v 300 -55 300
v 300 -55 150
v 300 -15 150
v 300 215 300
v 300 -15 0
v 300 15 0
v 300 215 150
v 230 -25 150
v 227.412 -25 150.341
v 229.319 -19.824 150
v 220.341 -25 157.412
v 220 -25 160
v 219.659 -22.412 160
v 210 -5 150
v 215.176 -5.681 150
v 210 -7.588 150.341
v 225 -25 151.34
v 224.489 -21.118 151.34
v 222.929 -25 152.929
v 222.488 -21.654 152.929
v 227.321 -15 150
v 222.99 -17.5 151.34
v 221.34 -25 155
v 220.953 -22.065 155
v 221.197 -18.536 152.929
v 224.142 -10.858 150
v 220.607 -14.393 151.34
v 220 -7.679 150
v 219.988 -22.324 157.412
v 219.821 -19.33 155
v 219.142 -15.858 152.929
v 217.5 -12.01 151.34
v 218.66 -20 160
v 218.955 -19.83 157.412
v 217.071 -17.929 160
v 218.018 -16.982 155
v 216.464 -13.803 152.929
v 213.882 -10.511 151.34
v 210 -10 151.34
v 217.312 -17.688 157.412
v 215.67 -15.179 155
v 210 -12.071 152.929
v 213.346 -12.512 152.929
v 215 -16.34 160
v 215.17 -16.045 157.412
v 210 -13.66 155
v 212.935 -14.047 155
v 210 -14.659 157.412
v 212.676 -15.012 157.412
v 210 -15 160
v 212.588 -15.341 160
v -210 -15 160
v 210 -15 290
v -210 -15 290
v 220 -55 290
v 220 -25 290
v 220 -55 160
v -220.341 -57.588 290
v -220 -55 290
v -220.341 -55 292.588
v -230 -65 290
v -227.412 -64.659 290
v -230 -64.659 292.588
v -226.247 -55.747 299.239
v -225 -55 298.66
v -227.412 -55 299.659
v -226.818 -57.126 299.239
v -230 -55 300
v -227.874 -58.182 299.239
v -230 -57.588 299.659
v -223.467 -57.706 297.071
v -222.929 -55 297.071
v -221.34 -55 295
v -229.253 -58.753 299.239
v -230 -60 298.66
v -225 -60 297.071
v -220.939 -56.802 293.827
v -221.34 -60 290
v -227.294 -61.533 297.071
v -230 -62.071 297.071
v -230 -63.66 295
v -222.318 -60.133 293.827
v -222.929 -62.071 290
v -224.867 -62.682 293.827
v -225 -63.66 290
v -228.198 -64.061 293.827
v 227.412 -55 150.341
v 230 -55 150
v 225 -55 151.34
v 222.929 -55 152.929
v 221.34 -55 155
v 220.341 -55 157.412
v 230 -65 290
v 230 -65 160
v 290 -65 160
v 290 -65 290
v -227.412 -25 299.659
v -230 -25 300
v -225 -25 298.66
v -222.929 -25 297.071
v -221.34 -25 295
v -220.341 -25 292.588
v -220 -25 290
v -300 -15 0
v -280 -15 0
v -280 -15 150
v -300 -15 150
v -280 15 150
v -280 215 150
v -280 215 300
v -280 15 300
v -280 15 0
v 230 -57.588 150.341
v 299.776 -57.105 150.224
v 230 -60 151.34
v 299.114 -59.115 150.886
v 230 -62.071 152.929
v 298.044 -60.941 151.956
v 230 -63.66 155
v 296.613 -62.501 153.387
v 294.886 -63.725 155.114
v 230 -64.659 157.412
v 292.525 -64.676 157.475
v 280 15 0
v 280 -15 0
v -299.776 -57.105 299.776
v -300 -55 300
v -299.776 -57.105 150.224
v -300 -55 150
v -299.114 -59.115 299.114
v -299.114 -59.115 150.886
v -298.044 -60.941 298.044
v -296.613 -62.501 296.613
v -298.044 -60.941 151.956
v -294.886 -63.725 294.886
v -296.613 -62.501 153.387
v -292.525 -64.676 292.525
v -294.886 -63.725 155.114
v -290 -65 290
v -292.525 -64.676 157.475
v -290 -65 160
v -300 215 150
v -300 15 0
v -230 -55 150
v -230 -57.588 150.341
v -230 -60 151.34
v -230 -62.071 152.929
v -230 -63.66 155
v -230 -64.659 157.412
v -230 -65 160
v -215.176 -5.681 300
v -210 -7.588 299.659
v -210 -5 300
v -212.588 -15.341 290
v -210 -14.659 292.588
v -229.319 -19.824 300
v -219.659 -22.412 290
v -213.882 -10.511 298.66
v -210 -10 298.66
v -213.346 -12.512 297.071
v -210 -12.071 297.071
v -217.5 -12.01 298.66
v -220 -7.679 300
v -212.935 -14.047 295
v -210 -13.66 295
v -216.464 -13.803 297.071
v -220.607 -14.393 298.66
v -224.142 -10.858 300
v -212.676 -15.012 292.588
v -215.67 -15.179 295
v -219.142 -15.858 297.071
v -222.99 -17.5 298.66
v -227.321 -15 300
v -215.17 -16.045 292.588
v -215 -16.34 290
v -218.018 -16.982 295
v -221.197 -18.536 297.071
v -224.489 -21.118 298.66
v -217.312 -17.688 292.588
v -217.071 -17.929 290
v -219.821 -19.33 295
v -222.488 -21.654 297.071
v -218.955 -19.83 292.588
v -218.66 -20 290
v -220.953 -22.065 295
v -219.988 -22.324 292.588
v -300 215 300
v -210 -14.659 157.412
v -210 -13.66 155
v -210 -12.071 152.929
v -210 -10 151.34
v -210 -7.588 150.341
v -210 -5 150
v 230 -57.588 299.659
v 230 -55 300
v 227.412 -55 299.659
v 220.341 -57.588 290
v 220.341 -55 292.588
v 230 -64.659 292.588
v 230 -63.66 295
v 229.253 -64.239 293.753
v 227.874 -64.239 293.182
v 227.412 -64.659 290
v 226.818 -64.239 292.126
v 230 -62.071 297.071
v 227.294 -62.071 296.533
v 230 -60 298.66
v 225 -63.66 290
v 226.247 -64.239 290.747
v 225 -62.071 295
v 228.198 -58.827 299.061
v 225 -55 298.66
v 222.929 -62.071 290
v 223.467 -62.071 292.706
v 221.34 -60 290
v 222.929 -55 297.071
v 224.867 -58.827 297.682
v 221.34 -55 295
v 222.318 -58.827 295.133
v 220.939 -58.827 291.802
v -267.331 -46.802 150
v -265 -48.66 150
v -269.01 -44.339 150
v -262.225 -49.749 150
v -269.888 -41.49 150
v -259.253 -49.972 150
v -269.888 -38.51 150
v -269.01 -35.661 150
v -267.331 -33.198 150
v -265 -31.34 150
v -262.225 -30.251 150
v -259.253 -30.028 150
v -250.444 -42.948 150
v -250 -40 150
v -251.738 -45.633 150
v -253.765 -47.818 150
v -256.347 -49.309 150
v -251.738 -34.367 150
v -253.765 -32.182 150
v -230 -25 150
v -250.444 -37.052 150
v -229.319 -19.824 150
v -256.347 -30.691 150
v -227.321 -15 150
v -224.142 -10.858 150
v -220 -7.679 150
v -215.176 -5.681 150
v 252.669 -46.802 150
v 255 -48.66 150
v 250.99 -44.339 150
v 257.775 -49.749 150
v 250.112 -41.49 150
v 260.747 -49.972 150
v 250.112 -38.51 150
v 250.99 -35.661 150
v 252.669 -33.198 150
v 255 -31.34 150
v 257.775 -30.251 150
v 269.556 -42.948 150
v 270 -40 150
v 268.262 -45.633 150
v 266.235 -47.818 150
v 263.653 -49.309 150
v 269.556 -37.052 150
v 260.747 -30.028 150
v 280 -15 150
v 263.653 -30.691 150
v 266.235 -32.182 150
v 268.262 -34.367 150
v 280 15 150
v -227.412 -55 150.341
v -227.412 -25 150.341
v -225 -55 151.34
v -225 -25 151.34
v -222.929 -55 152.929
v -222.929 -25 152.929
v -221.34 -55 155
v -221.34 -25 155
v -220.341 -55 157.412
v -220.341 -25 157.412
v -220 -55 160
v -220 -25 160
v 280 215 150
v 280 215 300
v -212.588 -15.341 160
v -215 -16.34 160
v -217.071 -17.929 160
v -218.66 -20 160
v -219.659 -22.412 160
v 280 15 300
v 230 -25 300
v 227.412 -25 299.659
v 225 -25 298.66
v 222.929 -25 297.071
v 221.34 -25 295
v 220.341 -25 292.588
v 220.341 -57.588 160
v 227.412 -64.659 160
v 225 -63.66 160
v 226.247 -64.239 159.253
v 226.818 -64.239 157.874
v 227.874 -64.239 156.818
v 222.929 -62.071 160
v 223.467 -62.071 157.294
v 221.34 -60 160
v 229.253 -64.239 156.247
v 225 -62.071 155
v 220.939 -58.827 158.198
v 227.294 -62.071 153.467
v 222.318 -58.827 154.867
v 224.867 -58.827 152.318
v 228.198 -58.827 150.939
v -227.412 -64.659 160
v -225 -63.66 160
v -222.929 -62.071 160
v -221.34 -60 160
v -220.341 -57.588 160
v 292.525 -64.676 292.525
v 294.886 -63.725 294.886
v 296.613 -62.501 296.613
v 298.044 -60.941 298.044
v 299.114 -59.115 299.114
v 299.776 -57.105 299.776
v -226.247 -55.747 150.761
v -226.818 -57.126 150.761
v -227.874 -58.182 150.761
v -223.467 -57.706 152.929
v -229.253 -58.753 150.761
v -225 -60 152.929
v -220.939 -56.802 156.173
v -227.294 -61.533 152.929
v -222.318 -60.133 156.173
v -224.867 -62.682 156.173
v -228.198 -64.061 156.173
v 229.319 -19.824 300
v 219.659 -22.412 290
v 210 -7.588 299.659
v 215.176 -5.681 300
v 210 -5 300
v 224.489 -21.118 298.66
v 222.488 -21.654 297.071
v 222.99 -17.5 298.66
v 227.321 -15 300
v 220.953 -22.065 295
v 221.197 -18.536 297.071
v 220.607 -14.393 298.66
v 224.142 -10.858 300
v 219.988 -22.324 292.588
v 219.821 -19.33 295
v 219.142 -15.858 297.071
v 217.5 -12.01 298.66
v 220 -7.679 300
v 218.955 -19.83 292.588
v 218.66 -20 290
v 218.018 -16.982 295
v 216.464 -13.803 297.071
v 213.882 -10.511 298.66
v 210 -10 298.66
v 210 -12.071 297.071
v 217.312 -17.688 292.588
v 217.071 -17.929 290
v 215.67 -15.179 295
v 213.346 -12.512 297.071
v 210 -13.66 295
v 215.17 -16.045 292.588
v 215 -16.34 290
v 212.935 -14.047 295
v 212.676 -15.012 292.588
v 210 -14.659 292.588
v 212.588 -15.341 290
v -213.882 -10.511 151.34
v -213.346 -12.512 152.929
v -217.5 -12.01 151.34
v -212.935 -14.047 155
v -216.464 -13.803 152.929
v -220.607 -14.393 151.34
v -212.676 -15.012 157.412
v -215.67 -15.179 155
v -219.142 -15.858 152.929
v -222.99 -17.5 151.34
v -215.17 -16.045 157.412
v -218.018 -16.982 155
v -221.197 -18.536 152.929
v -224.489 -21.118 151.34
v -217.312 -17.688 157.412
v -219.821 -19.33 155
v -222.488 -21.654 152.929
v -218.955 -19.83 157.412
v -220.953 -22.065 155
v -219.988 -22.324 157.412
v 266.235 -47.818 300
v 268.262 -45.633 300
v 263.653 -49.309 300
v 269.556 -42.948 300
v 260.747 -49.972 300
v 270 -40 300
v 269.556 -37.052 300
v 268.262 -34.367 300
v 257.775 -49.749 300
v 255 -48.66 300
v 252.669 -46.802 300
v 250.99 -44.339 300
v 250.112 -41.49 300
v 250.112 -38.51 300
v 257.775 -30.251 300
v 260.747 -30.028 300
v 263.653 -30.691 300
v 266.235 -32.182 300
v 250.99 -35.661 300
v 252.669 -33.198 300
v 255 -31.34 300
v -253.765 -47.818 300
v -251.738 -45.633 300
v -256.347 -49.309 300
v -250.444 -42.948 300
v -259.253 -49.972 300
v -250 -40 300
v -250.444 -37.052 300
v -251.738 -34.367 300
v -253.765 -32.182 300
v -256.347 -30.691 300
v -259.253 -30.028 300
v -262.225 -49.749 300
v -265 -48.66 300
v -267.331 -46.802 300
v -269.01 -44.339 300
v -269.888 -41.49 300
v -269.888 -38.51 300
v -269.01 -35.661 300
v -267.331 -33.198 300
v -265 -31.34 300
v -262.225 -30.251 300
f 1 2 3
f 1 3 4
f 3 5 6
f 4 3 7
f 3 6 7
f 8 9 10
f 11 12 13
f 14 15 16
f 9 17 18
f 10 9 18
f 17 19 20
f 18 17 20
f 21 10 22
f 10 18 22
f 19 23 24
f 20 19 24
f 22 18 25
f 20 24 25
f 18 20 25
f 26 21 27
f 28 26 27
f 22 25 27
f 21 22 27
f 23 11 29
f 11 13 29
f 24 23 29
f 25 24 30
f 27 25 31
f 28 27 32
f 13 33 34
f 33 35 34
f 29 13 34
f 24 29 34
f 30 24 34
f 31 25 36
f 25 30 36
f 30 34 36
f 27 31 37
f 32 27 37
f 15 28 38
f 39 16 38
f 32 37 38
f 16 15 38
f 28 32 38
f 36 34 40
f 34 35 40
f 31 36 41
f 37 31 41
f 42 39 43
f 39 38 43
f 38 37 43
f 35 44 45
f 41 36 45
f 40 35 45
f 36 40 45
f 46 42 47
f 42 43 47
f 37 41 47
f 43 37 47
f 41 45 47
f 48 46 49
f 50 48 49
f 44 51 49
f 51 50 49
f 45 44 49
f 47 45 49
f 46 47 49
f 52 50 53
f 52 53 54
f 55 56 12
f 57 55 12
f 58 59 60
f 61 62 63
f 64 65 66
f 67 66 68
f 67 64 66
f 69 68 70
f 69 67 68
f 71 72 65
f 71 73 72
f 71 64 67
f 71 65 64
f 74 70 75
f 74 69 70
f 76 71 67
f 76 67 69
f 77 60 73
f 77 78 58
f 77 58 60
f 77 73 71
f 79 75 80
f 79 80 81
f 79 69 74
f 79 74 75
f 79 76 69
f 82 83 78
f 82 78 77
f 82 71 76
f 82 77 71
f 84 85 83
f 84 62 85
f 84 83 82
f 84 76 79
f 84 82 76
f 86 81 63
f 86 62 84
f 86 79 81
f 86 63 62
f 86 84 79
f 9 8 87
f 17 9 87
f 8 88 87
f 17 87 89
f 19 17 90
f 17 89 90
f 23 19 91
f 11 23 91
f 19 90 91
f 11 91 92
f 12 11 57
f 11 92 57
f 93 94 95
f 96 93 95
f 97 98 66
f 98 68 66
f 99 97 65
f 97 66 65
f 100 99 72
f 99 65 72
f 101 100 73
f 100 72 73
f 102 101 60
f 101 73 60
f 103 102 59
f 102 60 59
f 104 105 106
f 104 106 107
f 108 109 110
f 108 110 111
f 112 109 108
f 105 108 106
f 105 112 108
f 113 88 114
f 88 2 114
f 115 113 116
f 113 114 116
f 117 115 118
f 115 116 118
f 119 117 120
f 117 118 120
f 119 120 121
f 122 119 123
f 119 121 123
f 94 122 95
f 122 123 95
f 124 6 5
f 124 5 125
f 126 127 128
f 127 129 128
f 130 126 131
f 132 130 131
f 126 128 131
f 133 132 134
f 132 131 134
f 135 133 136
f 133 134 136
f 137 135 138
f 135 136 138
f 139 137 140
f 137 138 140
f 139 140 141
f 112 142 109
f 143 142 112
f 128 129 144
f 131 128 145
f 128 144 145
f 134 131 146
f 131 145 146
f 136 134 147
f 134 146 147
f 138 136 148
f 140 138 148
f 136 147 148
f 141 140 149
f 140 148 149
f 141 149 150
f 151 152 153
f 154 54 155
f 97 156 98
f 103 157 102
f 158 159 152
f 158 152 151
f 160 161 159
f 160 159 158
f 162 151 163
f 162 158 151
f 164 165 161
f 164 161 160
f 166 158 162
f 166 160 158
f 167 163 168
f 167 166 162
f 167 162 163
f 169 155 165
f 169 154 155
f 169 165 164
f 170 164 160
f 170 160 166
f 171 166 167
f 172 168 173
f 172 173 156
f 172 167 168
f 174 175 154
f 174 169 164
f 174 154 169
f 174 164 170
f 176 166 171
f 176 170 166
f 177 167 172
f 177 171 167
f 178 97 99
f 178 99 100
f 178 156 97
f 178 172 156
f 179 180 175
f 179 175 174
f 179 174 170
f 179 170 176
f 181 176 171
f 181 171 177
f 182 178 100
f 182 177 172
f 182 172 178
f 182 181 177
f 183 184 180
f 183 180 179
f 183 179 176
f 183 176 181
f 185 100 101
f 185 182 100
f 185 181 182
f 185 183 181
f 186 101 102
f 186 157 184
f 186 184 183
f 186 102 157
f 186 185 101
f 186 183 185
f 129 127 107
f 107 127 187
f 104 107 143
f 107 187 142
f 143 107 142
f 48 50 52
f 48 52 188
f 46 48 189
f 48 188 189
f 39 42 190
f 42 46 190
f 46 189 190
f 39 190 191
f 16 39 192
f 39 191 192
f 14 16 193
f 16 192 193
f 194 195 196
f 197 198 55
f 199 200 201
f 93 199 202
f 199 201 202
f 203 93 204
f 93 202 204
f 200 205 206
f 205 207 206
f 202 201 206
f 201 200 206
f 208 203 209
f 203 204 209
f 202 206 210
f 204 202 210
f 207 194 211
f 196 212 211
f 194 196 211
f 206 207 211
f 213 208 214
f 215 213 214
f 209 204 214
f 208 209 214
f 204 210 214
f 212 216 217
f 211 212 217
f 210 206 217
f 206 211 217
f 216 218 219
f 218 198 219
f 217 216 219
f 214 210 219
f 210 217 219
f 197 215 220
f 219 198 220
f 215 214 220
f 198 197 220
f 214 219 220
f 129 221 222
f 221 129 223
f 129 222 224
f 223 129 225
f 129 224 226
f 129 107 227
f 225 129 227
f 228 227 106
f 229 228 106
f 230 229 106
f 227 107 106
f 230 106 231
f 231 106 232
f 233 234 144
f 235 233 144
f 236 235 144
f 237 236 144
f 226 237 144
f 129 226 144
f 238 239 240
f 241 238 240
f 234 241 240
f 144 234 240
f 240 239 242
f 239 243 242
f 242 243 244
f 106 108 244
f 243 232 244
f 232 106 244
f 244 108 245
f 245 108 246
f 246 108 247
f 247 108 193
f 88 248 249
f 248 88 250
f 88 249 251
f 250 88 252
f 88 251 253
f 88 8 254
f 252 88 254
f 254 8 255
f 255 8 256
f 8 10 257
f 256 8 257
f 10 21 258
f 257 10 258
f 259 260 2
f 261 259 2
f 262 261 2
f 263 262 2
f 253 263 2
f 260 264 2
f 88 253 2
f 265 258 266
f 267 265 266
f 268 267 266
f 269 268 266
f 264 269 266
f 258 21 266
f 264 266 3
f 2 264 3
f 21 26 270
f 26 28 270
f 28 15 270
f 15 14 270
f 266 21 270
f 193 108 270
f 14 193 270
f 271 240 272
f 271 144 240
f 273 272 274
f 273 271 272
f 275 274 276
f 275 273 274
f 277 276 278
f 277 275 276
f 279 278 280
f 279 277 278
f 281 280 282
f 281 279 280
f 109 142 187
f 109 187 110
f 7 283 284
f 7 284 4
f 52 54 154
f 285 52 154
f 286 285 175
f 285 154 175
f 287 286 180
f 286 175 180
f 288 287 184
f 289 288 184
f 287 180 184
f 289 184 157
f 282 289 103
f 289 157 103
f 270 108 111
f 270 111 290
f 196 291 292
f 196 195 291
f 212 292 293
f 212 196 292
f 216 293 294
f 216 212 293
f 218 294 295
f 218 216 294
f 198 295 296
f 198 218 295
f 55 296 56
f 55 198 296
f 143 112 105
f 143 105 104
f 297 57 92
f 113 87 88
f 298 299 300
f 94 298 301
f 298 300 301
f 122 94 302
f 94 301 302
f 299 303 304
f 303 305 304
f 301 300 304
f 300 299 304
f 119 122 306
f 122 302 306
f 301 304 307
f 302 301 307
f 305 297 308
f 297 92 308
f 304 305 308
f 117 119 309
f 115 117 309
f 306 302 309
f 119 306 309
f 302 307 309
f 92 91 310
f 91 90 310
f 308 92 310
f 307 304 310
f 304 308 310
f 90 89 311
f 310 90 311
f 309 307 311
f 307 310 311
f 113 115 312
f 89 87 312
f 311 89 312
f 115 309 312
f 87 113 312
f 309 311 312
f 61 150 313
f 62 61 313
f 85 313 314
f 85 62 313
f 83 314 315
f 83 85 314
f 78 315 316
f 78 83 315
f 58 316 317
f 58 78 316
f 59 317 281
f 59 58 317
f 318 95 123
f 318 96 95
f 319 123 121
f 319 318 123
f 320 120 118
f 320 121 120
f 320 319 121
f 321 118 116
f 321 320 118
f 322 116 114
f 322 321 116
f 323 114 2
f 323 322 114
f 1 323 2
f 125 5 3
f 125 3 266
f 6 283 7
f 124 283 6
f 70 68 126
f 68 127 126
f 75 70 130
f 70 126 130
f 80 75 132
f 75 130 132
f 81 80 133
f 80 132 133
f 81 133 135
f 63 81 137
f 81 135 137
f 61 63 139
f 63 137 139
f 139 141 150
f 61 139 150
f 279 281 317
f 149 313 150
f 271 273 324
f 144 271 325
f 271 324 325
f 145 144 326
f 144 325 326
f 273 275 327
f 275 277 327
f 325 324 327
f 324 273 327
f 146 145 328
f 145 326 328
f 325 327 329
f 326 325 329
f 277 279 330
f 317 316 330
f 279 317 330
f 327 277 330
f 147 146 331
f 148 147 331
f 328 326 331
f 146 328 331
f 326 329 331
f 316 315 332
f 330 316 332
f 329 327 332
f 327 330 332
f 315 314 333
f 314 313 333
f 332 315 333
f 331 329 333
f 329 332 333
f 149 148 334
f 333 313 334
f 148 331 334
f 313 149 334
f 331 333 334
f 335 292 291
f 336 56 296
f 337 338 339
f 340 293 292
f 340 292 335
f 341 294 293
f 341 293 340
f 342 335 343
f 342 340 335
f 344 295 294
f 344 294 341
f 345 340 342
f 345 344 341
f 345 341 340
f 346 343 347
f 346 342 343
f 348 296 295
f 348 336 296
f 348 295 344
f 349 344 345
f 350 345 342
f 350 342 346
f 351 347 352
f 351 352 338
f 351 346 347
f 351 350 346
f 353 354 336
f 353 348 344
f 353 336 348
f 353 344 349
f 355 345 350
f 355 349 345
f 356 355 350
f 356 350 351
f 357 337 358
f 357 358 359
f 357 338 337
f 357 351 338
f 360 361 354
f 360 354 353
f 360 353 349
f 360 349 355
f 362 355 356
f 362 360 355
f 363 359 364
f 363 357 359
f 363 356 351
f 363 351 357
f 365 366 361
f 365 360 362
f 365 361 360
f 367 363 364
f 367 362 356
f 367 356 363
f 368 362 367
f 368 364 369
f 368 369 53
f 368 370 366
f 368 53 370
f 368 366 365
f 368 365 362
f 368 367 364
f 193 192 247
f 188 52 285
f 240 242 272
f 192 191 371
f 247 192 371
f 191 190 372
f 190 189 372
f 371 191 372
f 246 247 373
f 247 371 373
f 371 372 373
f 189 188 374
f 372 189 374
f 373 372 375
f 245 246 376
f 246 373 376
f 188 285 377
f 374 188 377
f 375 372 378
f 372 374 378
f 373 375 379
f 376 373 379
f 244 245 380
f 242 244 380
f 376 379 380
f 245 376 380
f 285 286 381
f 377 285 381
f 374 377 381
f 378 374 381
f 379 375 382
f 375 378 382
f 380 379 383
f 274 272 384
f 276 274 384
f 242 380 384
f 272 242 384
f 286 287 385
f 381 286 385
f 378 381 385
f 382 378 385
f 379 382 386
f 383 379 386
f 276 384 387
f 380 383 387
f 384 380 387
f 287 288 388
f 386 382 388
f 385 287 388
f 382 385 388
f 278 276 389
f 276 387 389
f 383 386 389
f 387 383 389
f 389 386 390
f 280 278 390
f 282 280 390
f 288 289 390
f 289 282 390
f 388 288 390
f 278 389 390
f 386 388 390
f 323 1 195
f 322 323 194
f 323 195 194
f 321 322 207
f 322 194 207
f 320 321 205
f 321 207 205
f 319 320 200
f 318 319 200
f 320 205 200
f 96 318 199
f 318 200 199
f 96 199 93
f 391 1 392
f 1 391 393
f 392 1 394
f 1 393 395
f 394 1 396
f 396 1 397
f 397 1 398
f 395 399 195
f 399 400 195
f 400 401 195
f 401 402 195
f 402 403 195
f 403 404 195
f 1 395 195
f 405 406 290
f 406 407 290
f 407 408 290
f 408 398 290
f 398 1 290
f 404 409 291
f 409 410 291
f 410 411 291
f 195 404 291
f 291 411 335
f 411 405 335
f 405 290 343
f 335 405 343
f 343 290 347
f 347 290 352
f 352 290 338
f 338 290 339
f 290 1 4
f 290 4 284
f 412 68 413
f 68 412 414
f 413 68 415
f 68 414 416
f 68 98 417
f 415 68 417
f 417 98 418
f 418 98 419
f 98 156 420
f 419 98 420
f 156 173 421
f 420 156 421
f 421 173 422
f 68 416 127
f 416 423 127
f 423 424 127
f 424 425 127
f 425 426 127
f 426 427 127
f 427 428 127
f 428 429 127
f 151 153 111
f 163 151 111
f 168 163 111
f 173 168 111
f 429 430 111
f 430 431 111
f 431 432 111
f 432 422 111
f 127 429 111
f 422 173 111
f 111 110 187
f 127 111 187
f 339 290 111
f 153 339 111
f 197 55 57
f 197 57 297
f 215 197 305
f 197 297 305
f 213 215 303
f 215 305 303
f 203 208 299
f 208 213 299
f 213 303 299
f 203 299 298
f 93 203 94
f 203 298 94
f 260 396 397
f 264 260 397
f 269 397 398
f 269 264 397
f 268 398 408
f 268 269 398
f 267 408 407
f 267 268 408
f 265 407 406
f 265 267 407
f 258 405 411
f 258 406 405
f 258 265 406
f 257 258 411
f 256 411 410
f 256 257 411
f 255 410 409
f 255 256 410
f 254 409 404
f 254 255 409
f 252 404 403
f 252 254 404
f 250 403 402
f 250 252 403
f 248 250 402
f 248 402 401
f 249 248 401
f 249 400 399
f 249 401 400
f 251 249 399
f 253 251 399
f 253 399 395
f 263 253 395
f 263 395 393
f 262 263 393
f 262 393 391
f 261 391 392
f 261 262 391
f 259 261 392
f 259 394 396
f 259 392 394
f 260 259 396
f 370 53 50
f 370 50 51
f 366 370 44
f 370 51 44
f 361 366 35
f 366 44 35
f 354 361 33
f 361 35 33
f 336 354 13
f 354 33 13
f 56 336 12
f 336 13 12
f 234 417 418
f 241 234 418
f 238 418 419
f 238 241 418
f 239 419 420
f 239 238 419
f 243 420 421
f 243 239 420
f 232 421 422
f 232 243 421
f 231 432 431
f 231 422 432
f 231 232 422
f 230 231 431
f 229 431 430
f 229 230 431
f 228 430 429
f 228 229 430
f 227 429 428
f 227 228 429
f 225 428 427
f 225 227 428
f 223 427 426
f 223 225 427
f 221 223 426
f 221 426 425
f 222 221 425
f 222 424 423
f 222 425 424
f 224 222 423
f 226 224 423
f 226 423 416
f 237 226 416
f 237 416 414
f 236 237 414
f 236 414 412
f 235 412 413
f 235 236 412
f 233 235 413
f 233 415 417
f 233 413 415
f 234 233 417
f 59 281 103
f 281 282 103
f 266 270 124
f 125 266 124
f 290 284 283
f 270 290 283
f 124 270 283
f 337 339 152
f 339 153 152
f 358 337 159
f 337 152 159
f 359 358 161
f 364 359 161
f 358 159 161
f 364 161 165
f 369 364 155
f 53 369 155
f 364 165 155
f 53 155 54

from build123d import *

# Parameters (mm, degrees)
EXTRUDE_1_DEPTH          = 300
CUT_EXTRUDE_1_DEPTH      = 688.477272352
CUT_EXTRUDE_1_DEPTH_BACK = 688.477272352
SKETCH_3_W               = 560
SKETCH_3_H               = 150
CUT_EXTRUDE_2_DEPTH      = 470.041575982
EXTRUDE_2_DEPTH          = 50
FILLET_1_R               = 10
CUT_EXTRUDE_3_DEPTH      = 476.631159618
CUT_EXTRUDE_3_DEPTH_BACK = 476.631159618
SKETCH_5_R               = 10


with BuildPart() as part:
    # Эскиз1 → Бобышка-Вытянуть1 (new body)
    with BuildSketch(Plane.XY):
        Polygon((-300, -15), (-300, 0), (-300, 215), (-280, 215), (-280, 15), (280, 15), (280, 215), (300, 215), (300, 0), (300, -15), align=None)
    extrude(amount=EXTRUDE_1_DEPTH)

    # Эскиз2 → Вырез-Вытянуть1 (cut, two sides: drawn at the far end of the back side and taken through both)
    with BuildSketch(Plane(origin=(-280, 0, 0), x_dir=(0, 0, -1), z_dir=(1, 0, 0)).offset(-CUT_EXTRUDE_1_DEPTH_BACK)):
        Polygon((-150, 215), (0, 15), (0, 215), align=None)
    extrude(amount=CUT_EXTRUDE_1_DEPTH + CUT_EXTRUDE_1_DEPTH_BACK, mode=Mode.SUBTRACT)

    # Эскиз3 → Вырез-Вытянуть2 (cut, through all)
    with BuildSketch(Plane(origin=(0, 15, 0), x_dir=(1, 0, 0), z_dir=(0, 1, 0))):
        with Locations((0, -75)):
            Rectangle(SKETCH_3_W, SKETCH_3_H)
    extrude(amount=-CUT_EXTRUDE_2_DEPTH, mode=Mode.SUBTRACT)

    # Эскиз4 → Бобышка-Вытянуть2 (add)
    with BuildSketch(Plane.XZ.offset(15)):
        Polygon((-220, 300), (-300, 300), (-300, 150), (-280, 150), (-220, 150), align=None)
        Polygon((300, 300), (220, 300), (220, 150), (280, 150), (300, 150), align=None)
    extrude(amount=EXTRUDE_2_DEPTH)

    # Скругление1
    fillet_1_edges = [part.edges().sort_by_distance(p)[0] for p in [
        (0, -15, 150),
        (-220, -65, 225),
        (-220, -40, 150),
        (-220, -40, 300),
        (-260, -65, 150),
        (-260, -65, 300),
        (-300, -65, 225),
        (-220, -15, 225),
        (0, -15, 300),
        (220, -15, 225),
        (220, -40, 300),
        (220, -40, 150),
        (260, -65, 300),
        (220, -65, 225),
        (260, -65, 150),
        (300, -65, 225),
    ]]
    fillet(fillet_1_edges, radius=FILLET_1_R)

    # Эскиз5 → Вырез-Вытянуть3 (cut, two sides: drawn at the far end of the back side and taken through both)
    with BuildSketch(Plane.XY.offset(300).offset(-CUT_EXTRUDE_3_DEPTH_BACK)):
        with Locations((-260, -40)):
            Circle(SKETCH_5_R)
        with Locations((260, -40)):
            Circle(SKETCH_5_R)
    extrude(amount=CUT_EXTRUDE_3_DEPTH + CUT_EXTRUDE_3_DEPTH_BACK, mode=Mode.SUBTRACT)


solid = part.part
